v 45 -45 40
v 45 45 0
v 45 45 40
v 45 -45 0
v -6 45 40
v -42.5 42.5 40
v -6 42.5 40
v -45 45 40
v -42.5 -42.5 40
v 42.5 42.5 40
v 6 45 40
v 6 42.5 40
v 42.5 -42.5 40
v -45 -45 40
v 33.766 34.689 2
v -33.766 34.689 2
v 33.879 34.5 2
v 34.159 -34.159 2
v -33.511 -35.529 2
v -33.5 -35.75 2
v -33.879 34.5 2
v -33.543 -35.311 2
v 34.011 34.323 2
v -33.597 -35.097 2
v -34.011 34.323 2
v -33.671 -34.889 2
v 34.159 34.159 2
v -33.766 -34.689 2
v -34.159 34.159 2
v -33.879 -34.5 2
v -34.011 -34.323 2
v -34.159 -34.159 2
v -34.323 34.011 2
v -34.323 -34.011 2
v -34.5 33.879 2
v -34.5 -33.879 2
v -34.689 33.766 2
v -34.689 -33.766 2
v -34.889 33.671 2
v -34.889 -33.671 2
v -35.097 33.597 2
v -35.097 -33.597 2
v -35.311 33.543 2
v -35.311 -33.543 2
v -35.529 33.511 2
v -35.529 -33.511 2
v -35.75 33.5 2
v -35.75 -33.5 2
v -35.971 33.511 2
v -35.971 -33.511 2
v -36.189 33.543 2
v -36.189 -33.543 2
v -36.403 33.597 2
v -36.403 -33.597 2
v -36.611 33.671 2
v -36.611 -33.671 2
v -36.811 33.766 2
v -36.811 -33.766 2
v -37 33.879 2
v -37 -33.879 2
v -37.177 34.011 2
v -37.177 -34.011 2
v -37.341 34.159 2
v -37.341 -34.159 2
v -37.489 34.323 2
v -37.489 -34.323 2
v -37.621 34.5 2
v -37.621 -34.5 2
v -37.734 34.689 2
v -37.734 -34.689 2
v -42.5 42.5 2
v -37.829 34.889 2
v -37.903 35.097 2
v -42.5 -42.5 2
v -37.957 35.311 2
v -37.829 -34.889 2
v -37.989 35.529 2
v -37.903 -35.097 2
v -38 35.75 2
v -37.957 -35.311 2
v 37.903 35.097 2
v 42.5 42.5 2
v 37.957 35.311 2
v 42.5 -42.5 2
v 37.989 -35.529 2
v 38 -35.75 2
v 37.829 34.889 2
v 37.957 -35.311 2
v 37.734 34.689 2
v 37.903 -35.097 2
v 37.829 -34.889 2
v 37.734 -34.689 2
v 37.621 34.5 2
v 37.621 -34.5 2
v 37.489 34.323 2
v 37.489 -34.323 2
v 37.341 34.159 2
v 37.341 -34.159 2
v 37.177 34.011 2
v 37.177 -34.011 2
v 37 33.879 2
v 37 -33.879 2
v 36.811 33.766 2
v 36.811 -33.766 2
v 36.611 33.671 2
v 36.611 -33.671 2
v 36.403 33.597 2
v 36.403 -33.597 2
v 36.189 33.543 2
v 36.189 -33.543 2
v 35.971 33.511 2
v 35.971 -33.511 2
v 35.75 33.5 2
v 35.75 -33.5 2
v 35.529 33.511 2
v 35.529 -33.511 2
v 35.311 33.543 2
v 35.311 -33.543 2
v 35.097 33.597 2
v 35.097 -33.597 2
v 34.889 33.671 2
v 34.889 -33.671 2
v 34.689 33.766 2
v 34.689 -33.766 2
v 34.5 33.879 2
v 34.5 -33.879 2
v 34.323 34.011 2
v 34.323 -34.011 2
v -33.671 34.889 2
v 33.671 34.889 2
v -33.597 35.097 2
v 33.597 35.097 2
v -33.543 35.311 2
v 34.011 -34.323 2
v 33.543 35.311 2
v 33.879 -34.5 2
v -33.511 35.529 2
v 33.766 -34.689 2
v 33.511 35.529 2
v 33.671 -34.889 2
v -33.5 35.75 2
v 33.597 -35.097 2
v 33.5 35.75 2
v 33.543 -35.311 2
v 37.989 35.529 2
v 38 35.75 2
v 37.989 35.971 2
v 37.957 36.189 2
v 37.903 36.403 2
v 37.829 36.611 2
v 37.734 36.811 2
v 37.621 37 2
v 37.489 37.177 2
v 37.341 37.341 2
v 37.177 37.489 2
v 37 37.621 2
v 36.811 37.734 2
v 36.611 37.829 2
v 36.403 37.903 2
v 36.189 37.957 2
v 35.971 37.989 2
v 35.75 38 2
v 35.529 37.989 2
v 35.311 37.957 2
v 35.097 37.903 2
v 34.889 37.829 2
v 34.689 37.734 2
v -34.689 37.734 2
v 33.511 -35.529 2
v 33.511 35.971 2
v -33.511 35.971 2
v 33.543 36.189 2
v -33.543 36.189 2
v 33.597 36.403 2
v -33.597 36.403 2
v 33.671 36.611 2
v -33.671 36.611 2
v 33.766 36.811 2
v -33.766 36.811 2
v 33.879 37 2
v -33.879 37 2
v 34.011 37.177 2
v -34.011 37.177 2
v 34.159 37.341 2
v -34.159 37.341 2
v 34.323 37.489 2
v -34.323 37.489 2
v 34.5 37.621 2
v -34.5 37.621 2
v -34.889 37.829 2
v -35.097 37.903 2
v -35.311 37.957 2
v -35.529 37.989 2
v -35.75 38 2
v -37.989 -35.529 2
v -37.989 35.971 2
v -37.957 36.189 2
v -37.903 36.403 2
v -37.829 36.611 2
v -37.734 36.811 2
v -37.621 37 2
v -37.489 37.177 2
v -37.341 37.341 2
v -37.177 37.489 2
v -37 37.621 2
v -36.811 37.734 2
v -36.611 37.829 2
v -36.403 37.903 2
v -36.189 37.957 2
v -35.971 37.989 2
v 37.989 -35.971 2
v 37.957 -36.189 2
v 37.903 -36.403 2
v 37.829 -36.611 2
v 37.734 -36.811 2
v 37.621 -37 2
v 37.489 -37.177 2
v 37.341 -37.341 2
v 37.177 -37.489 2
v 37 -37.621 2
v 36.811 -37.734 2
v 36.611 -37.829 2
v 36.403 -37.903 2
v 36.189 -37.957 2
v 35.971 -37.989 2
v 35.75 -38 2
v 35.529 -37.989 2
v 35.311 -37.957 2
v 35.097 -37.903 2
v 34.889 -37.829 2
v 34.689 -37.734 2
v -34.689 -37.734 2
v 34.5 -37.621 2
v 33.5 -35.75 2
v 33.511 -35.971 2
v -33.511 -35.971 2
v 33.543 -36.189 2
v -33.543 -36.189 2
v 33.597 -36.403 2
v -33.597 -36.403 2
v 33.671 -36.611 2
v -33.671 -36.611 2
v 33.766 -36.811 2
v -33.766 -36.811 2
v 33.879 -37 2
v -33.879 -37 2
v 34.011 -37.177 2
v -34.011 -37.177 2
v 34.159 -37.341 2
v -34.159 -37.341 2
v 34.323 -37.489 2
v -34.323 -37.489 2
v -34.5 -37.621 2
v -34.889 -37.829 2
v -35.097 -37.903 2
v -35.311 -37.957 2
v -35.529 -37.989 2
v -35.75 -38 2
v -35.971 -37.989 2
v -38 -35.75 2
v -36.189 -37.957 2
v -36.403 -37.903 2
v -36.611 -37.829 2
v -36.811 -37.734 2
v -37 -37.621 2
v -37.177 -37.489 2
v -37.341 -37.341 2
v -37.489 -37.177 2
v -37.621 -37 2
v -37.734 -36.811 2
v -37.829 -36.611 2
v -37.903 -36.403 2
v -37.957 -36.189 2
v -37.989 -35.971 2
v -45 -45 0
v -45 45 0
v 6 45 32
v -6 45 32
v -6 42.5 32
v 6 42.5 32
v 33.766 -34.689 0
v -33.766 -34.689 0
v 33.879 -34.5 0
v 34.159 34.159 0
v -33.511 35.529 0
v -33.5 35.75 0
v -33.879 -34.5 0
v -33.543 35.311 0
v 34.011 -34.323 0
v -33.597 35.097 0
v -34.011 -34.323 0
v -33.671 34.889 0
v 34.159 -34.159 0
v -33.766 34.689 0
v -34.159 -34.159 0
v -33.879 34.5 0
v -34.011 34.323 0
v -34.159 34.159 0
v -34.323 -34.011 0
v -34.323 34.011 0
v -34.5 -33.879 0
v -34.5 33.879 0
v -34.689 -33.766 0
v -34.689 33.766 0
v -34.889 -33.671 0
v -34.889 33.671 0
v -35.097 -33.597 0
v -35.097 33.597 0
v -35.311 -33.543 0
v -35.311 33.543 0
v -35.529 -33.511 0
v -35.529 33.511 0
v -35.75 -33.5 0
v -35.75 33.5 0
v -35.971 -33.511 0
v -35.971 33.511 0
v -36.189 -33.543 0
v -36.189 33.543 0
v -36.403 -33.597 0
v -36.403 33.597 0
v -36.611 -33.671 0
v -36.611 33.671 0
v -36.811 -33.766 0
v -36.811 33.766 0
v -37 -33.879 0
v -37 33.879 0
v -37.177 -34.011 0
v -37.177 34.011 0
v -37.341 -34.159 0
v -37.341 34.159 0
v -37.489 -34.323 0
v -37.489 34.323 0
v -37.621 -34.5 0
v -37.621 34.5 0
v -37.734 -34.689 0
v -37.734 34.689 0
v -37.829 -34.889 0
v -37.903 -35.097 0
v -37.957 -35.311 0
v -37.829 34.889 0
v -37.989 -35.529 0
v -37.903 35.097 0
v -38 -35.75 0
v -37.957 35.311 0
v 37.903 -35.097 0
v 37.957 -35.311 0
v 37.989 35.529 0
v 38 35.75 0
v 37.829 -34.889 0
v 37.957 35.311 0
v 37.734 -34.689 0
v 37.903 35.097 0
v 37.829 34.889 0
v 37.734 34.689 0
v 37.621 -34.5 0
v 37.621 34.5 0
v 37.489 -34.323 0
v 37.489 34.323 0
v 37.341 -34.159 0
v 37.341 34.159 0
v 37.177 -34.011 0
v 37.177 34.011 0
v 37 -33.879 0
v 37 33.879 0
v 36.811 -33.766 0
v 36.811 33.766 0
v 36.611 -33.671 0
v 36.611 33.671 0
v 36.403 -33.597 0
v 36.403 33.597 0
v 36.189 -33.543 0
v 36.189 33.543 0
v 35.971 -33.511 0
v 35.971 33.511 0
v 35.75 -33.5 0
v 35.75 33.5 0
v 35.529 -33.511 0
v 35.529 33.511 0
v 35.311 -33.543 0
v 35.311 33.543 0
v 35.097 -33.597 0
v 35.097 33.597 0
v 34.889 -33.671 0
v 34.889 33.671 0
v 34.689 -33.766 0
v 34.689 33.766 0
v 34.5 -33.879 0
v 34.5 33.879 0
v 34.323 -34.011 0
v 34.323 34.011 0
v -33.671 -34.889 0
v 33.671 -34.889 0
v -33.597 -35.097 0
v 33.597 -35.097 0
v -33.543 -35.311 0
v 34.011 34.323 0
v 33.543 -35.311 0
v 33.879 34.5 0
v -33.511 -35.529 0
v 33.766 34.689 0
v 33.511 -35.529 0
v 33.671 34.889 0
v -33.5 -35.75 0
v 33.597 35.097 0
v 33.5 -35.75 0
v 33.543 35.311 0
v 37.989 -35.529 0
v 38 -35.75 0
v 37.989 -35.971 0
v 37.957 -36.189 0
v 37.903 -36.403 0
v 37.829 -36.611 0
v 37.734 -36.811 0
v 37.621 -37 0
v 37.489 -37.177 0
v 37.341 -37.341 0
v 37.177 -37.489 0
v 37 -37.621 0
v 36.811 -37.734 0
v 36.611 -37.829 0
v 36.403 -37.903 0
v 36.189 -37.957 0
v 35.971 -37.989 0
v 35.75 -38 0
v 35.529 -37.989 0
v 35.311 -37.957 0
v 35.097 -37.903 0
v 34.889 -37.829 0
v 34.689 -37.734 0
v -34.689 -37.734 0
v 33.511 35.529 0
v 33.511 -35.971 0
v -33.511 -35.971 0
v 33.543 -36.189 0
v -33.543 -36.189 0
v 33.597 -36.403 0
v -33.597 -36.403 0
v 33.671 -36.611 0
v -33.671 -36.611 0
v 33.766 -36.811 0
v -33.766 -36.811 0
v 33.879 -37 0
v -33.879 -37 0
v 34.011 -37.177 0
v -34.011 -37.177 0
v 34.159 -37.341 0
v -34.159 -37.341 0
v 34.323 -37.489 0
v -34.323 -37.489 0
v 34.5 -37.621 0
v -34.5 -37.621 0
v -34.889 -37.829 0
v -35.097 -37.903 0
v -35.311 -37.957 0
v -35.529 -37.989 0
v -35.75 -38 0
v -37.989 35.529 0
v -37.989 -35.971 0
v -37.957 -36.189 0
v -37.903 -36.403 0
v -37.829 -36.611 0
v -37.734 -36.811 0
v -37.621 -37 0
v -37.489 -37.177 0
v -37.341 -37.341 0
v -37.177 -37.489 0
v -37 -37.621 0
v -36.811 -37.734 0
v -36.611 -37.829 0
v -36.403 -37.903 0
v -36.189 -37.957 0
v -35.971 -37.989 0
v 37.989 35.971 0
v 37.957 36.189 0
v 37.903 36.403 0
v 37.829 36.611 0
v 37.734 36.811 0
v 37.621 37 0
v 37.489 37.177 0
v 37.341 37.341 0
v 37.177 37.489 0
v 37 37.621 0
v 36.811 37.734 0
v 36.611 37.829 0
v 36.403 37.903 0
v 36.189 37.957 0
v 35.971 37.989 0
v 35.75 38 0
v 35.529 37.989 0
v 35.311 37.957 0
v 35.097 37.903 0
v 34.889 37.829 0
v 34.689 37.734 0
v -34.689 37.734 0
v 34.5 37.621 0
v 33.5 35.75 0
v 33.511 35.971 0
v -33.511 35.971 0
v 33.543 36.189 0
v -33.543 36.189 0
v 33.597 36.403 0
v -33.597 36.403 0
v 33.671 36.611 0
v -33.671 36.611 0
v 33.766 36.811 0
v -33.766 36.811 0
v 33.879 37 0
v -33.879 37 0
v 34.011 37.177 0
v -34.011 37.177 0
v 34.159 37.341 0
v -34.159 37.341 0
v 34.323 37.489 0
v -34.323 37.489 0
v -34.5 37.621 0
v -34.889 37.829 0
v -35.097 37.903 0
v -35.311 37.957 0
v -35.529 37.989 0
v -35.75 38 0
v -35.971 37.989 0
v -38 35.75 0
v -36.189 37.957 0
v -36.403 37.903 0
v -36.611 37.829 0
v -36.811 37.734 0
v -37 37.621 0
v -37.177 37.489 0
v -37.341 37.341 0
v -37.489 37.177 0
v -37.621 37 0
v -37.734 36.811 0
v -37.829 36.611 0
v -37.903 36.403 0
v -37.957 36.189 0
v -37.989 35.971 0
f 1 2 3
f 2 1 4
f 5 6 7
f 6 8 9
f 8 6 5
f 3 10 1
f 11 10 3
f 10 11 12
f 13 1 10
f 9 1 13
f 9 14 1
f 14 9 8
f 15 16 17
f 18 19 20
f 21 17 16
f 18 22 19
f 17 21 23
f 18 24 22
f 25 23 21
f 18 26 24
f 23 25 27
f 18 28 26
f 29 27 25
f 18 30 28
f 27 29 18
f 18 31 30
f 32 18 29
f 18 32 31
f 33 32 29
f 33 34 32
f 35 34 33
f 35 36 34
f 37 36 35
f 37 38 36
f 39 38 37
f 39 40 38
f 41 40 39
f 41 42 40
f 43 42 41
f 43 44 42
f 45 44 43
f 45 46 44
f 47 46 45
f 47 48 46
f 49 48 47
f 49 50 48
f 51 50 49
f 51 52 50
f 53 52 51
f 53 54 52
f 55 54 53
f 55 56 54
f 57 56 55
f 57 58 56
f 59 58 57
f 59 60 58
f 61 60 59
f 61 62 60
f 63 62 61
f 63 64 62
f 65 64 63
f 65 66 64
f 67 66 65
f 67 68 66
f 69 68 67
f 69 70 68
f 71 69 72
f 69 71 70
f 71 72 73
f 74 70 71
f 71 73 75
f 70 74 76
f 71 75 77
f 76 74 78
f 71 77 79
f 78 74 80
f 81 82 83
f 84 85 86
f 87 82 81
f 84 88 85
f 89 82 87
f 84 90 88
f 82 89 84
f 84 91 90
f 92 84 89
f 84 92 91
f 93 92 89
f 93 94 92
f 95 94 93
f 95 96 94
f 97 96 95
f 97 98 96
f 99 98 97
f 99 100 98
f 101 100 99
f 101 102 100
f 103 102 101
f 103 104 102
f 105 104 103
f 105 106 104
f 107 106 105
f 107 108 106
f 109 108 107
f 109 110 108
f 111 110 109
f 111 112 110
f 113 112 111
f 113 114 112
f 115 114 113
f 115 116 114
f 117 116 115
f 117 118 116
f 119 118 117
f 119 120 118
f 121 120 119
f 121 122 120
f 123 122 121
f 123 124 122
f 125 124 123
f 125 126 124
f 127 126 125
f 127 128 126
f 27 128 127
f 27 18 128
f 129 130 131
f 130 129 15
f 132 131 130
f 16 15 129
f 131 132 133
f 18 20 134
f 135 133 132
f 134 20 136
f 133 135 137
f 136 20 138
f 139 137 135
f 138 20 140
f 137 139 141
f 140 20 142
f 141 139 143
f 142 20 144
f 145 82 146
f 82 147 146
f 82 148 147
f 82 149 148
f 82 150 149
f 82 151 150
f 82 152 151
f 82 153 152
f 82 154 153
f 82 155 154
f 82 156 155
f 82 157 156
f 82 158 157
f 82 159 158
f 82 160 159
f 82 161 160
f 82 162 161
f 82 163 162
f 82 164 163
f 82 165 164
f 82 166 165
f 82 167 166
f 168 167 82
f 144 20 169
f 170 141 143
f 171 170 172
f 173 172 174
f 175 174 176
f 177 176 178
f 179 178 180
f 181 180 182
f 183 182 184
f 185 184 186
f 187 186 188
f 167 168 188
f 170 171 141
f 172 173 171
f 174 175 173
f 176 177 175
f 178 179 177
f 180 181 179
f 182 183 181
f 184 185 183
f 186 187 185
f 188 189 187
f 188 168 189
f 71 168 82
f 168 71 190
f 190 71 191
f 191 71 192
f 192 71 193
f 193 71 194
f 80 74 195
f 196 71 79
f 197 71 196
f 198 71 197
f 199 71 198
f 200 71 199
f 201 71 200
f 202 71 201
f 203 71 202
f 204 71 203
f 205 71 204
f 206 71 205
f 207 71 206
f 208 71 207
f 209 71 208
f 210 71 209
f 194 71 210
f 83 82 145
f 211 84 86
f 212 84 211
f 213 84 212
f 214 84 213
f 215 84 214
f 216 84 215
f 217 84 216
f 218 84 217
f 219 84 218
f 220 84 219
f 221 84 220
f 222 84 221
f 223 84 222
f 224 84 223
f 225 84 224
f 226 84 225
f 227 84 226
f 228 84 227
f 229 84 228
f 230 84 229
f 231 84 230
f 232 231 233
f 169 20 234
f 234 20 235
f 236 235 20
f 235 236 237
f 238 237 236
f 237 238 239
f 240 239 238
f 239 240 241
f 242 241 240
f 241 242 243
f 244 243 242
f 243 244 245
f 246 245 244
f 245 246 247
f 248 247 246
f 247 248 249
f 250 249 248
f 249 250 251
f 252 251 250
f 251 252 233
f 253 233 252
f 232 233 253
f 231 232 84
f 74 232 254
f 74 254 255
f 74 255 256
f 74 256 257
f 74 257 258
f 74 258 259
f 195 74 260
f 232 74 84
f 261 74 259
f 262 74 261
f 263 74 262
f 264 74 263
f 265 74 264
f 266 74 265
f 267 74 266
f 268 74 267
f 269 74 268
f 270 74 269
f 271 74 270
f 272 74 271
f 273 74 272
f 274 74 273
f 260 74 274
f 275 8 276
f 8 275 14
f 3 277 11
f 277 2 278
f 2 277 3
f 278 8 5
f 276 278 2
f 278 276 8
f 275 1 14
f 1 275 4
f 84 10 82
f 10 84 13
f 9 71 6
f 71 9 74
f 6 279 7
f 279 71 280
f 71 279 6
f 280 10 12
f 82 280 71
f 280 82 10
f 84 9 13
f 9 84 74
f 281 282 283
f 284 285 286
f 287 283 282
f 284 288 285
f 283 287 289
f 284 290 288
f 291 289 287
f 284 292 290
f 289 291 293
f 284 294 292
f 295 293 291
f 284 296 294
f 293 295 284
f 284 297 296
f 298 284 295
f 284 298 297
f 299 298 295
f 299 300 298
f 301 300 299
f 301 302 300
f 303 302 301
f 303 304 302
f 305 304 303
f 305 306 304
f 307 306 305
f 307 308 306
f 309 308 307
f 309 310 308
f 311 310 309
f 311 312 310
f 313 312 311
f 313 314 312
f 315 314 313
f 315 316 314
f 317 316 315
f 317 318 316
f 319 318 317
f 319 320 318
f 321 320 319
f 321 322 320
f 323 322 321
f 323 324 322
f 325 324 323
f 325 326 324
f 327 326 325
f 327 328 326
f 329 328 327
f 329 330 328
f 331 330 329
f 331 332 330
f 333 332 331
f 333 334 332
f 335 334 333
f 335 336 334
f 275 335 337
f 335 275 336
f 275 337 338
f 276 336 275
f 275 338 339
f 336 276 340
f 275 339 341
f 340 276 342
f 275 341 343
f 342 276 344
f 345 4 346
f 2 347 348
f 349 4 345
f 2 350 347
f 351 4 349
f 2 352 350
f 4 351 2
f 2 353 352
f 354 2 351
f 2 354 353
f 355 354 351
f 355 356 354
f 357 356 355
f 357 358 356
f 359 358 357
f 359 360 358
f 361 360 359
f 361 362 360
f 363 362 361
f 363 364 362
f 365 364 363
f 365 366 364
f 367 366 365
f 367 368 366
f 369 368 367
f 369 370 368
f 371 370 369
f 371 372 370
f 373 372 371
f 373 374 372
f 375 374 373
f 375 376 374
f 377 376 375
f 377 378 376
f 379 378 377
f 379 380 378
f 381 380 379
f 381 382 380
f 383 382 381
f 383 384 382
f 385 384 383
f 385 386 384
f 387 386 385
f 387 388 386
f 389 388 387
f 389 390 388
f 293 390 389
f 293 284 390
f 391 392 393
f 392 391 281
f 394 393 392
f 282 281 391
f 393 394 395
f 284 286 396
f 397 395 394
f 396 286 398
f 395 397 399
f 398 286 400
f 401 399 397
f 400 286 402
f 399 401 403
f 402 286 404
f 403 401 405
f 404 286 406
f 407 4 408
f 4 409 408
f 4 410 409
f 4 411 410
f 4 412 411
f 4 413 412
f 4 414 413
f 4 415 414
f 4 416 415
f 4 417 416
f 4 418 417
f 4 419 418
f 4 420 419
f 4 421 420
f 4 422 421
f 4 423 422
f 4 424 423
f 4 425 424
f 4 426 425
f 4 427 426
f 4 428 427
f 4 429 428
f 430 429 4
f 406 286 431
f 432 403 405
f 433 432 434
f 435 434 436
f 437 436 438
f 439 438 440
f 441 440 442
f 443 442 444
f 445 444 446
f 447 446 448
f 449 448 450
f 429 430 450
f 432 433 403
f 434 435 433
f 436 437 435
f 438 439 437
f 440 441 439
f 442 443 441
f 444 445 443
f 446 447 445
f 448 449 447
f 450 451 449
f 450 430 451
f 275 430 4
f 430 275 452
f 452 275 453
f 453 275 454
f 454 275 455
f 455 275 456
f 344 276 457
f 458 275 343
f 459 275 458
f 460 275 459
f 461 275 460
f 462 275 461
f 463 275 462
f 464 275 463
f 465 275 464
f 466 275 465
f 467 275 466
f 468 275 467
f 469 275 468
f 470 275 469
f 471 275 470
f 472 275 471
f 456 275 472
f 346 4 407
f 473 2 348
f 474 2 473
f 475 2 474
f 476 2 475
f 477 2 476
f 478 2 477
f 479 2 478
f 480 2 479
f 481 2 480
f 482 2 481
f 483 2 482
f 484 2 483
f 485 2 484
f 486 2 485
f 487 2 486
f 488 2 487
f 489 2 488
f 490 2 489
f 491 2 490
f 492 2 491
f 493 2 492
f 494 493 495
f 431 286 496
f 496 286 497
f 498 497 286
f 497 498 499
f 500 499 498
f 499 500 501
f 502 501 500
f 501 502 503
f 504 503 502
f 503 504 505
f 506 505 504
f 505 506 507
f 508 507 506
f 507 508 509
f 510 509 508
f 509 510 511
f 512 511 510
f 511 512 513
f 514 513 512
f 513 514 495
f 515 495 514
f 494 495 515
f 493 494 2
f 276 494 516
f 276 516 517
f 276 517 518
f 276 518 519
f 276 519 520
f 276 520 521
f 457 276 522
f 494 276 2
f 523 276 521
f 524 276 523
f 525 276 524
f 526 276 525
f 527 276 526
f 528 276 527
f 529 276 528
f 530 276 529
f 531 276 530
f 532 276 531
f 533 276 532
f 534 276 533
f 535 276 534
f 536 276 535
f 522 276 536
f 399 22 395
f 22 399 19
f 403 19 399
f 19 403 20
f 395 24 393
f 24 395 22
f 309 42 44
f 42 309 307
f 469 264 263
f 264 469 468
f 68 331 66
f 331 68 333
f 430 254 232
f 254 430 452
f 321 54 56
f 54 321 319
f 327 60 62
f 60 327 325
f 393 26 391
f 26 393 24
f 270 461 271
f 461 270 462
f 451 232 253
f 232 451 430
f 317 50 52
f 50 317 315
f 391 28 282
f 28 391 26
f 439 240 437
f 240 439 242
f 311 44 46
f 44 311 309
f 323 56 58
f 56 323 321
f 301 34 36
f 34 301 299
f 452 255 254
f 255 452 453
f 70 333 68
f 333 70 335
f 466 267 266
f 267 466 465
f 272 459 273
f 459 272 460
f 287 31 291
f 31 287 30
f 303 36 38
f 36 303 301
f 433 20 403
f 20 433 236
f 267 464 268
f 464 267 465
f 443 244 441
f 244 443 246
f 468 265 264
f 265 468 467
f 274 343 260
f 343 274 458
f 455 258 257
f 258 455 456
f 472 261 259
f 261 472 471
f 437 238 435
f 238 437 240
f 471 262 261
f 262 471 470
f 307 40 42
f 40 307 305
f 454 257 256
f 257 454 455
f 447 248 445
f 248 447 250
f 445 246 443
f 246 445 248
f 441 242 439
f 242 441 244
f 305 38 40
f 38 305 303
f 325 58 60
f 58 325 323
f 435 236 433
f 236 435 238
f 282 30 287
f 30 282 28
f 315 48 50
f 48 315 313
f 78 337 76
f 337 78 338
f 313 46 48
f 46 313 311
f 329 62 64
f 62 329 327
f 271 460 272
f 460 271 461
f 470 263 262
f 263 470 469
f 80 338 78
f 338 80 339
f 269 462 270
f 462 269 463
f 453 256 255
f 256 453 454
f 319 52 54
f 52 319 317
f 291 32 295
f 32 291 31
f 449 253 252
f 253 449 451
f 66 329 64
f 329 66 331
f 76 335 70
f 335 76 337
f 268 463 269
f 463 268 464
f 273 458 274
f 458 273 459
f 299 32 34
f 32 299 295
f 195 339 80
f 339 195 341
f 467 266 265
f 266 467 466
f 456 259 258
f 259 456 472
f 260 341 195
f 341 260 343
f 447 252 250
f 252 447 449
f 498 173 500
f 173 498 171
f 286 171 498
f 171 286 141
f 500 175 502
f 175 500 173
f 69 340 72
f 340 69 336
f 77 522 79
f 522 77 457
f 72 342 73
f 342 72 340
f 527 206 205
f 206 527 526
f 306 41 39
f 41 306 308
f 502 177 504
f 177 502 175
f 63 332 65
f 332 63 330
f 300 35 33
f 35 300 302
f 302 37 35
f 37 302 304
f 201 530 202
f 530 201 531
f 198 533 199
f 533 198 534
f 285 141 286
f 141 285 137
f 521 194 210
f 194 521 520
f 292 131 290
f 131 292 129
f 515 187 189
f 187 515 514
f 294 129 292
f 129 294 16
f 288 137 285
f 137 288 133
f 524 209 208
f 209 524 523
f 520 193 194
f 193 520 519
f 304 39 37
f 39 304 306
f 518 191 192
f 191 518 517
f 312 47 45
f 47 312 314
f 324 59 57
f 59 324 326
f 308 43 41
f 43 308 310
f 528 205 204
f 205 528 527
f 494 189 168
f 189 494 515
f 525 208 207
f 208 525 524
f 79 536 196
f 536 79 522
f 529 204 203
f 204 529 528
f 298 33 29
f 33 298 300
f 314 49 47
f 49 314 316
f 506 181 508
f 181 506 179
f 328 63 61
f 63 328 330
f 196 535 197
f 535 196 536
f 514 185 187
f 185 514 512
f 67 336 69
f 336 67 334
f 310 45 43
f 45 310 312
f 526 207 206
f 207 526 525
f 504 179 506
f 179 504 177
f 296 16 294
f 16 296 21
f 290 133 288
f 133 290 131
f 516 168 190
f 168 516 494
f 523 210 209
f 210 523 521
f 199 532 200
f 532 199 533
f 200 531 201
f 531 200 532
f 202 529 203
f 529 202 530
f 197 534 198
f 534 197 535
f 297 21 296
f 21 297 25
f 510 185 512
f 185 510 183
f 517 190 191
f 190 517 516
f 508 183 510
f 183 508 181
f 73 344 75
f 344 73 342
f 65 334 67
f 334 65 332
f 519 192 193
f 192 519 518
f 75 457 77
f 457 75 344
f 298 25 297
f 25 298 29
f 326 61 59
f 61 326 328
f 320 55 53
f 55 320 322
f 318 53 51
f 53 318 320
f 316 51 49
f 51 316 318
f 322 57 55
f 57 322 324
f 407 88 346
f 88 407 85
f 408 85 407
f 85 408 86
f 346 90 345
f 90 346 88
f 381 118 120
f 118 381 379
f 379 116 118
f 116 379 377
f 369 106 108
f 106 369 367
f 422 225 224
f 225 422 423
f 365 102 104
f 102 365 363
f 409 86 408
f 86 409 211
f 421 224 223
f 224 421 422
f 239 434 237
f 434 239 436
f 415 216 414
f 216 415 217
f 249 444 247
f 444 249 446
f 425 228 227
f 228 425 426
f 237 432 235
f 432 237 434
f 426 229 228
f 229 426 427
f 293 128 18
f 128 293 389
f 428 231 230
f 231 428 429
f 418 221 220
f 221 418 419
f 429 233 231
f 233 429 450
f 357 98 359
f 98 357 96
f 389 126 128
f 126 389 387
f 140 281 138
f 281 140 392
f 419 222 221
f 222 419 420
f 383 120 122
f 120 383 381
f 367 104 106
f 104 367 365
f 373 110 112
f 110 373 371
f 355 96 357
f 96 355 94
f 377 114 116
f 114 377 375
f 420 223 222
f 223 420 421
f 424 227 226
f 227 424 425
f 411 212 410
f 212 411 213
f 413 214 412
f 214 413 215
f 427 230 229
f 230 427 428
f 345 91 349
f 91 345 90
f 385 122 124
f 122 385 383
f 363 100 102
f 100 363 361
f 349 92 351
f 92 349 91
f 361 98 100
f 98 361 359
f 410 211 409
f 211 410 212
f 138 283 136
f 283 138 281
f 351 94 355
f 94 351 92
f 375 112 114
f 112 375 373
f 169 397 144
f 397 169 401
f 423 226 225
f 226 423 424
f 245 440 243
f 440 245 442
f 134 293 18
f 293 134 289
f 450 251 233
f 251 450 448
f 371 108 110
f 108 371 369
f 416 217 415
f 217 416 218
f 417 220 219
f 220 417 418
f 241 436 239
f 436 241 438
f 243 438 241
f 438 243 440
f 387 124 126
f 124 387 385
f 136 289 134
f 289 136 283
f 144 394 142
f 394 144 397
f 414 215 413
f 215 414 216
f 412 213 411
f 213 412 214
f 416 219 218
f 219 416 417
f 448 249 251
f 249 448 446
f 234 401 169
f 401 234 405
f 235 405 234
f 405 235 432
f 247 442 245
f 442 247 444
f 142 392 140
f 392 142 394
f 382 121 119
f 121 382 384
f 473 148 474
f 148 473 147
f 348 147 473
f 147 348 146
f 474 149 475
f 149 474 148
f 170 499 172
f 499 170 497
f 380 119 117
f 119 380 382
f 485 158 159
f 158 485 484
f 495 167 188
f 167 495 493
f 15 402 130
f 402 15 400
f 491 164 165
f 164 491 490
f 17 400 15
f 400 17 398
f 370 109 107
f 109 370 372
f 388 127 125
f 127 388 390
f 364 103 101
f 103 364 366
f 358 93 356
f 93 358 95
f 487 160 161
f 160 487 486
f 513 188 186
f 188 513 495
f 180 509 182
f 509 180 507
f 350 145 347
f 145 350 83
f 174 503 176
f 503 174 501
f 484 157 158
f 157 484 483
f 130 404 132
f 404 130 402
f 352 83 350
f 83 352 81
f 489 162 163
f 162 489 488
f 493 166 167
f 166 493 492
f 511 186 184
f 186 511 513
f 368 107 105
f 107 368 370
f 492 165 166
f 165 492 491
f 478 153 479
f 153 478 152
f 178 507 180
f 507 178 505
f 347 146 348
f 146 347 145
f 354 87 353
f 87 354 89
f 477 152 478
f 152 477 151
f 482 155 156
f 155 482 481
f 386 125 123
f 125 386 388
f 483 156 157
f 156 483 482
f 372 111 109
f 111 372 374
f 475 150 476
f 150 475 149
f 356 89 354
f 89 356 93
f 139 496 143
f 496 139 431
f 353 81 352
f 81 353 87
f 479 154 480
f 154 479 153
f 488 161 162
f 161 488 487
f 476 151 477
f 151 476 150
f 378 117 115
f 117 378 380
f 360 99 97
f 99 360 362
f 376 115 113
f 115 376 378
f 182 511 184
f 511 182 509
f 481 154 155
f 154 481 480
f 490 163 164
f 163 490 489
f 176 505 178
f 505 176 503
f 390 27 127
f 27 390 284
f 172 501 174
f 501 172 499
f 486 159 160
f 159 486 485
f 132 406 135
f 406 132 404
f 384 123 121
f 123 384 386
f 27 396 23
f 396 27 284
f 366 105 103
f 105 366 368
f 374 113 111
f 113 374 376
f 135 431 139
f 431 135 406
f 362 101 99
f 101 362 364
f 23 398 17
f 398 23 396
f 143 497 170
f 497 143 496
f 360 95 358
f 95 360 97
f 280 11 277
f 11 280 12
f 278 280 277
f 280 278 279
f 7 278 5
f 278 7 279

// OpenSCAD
// Magnetic Stirrer Housing
// Designed for an 80mm PC fan.
// Print orientation: Top plate on the bed (z=0).
// Centered on X and Y.

// Dimensions
outer_dim      = 90.0;    // Outer width and length (mm)
top_thickness  = 2.0;     // Thickness of the top plate (mm)
wall_thickness = 2.5;     // Thickness of the four walls (mm)
total_height   = 40.0;    // Total height from top plate to open edge (mm)
hole_diam      = 4.5;     // Diameter of M4 screw holes (mm)
hole_pattern   = 71.5;    // Square pattern for fan mounting holes (mm)
notch_width    = 12.0;    // Width of the cable notch (mm)
notch_depth    = 8.0;     // Depth of the notch from the open edge (mm)

$fn = 64;

// Calculations
wall_height = total_height - top_thickness;

// We build the part starting from Z=0 to avoid "2 separate bodies" 
// and ensure the bounding box Z is exactly 40.0.
difference() {
    // --- MAIN BODY ---
    union() {
        // 1. The top plate (z=0 to z=2)
        // Centered on X and Y
        translate([-outer_dim/2, -outer_dim/2, 0])
            cube([outer_dim, outer_dim, top_thickness]);
        
        // 2. The four walls (z=2 to z=40)
        // We build the walls as a single hollowed block to ensure it's one body
        translate([-outer_dim/2, -outer_dim/2, top_thickness]) {
            difference() {
                // Outer wall boundary
                cube([outer_dim, outer_dim, wall_height]);
                // Inner cavity
                translate([wall_thickness, wall_thickness, -0.1])
                    cube([outer_dim - 2*wall_thickness, outer_dim - 2*wall_thickness, wall_height + 0.2]);
            }
        }
    }

    // --- SUBTRACTIONS ---

    // 1. Screw Holes (M4)
    // Pattern is 71.5mm square, centered on the plate.
    // Holes go through the top plate (z=0 to z=2).
    for (sx = [-1, 1], sy = [-1, 1]) {
        translate([sx * hole_pattern / 2, sy * hole_pattern / 2, -0.1])
            cylinder(h = top_thickness + 0.2, d = hole_diam);
    }

    // 2. Cable Notch
    // Centered along one wall, reaching 8mm down from the open edge.
    // Open edge is at Z = 40. Notch is from Z = 32 to Z = 40.
    // We place it on the wall at +Y (Y = outer_dim/2).
    // The notch cuts through the wall thickness.
    translate([-notch_width / 2, outer_dim / 2 - wall_thickness, total_height - notch_depth])
        cube([notch_width, wall_thickness + 0.2, notch_depth + 0.1]);
}
